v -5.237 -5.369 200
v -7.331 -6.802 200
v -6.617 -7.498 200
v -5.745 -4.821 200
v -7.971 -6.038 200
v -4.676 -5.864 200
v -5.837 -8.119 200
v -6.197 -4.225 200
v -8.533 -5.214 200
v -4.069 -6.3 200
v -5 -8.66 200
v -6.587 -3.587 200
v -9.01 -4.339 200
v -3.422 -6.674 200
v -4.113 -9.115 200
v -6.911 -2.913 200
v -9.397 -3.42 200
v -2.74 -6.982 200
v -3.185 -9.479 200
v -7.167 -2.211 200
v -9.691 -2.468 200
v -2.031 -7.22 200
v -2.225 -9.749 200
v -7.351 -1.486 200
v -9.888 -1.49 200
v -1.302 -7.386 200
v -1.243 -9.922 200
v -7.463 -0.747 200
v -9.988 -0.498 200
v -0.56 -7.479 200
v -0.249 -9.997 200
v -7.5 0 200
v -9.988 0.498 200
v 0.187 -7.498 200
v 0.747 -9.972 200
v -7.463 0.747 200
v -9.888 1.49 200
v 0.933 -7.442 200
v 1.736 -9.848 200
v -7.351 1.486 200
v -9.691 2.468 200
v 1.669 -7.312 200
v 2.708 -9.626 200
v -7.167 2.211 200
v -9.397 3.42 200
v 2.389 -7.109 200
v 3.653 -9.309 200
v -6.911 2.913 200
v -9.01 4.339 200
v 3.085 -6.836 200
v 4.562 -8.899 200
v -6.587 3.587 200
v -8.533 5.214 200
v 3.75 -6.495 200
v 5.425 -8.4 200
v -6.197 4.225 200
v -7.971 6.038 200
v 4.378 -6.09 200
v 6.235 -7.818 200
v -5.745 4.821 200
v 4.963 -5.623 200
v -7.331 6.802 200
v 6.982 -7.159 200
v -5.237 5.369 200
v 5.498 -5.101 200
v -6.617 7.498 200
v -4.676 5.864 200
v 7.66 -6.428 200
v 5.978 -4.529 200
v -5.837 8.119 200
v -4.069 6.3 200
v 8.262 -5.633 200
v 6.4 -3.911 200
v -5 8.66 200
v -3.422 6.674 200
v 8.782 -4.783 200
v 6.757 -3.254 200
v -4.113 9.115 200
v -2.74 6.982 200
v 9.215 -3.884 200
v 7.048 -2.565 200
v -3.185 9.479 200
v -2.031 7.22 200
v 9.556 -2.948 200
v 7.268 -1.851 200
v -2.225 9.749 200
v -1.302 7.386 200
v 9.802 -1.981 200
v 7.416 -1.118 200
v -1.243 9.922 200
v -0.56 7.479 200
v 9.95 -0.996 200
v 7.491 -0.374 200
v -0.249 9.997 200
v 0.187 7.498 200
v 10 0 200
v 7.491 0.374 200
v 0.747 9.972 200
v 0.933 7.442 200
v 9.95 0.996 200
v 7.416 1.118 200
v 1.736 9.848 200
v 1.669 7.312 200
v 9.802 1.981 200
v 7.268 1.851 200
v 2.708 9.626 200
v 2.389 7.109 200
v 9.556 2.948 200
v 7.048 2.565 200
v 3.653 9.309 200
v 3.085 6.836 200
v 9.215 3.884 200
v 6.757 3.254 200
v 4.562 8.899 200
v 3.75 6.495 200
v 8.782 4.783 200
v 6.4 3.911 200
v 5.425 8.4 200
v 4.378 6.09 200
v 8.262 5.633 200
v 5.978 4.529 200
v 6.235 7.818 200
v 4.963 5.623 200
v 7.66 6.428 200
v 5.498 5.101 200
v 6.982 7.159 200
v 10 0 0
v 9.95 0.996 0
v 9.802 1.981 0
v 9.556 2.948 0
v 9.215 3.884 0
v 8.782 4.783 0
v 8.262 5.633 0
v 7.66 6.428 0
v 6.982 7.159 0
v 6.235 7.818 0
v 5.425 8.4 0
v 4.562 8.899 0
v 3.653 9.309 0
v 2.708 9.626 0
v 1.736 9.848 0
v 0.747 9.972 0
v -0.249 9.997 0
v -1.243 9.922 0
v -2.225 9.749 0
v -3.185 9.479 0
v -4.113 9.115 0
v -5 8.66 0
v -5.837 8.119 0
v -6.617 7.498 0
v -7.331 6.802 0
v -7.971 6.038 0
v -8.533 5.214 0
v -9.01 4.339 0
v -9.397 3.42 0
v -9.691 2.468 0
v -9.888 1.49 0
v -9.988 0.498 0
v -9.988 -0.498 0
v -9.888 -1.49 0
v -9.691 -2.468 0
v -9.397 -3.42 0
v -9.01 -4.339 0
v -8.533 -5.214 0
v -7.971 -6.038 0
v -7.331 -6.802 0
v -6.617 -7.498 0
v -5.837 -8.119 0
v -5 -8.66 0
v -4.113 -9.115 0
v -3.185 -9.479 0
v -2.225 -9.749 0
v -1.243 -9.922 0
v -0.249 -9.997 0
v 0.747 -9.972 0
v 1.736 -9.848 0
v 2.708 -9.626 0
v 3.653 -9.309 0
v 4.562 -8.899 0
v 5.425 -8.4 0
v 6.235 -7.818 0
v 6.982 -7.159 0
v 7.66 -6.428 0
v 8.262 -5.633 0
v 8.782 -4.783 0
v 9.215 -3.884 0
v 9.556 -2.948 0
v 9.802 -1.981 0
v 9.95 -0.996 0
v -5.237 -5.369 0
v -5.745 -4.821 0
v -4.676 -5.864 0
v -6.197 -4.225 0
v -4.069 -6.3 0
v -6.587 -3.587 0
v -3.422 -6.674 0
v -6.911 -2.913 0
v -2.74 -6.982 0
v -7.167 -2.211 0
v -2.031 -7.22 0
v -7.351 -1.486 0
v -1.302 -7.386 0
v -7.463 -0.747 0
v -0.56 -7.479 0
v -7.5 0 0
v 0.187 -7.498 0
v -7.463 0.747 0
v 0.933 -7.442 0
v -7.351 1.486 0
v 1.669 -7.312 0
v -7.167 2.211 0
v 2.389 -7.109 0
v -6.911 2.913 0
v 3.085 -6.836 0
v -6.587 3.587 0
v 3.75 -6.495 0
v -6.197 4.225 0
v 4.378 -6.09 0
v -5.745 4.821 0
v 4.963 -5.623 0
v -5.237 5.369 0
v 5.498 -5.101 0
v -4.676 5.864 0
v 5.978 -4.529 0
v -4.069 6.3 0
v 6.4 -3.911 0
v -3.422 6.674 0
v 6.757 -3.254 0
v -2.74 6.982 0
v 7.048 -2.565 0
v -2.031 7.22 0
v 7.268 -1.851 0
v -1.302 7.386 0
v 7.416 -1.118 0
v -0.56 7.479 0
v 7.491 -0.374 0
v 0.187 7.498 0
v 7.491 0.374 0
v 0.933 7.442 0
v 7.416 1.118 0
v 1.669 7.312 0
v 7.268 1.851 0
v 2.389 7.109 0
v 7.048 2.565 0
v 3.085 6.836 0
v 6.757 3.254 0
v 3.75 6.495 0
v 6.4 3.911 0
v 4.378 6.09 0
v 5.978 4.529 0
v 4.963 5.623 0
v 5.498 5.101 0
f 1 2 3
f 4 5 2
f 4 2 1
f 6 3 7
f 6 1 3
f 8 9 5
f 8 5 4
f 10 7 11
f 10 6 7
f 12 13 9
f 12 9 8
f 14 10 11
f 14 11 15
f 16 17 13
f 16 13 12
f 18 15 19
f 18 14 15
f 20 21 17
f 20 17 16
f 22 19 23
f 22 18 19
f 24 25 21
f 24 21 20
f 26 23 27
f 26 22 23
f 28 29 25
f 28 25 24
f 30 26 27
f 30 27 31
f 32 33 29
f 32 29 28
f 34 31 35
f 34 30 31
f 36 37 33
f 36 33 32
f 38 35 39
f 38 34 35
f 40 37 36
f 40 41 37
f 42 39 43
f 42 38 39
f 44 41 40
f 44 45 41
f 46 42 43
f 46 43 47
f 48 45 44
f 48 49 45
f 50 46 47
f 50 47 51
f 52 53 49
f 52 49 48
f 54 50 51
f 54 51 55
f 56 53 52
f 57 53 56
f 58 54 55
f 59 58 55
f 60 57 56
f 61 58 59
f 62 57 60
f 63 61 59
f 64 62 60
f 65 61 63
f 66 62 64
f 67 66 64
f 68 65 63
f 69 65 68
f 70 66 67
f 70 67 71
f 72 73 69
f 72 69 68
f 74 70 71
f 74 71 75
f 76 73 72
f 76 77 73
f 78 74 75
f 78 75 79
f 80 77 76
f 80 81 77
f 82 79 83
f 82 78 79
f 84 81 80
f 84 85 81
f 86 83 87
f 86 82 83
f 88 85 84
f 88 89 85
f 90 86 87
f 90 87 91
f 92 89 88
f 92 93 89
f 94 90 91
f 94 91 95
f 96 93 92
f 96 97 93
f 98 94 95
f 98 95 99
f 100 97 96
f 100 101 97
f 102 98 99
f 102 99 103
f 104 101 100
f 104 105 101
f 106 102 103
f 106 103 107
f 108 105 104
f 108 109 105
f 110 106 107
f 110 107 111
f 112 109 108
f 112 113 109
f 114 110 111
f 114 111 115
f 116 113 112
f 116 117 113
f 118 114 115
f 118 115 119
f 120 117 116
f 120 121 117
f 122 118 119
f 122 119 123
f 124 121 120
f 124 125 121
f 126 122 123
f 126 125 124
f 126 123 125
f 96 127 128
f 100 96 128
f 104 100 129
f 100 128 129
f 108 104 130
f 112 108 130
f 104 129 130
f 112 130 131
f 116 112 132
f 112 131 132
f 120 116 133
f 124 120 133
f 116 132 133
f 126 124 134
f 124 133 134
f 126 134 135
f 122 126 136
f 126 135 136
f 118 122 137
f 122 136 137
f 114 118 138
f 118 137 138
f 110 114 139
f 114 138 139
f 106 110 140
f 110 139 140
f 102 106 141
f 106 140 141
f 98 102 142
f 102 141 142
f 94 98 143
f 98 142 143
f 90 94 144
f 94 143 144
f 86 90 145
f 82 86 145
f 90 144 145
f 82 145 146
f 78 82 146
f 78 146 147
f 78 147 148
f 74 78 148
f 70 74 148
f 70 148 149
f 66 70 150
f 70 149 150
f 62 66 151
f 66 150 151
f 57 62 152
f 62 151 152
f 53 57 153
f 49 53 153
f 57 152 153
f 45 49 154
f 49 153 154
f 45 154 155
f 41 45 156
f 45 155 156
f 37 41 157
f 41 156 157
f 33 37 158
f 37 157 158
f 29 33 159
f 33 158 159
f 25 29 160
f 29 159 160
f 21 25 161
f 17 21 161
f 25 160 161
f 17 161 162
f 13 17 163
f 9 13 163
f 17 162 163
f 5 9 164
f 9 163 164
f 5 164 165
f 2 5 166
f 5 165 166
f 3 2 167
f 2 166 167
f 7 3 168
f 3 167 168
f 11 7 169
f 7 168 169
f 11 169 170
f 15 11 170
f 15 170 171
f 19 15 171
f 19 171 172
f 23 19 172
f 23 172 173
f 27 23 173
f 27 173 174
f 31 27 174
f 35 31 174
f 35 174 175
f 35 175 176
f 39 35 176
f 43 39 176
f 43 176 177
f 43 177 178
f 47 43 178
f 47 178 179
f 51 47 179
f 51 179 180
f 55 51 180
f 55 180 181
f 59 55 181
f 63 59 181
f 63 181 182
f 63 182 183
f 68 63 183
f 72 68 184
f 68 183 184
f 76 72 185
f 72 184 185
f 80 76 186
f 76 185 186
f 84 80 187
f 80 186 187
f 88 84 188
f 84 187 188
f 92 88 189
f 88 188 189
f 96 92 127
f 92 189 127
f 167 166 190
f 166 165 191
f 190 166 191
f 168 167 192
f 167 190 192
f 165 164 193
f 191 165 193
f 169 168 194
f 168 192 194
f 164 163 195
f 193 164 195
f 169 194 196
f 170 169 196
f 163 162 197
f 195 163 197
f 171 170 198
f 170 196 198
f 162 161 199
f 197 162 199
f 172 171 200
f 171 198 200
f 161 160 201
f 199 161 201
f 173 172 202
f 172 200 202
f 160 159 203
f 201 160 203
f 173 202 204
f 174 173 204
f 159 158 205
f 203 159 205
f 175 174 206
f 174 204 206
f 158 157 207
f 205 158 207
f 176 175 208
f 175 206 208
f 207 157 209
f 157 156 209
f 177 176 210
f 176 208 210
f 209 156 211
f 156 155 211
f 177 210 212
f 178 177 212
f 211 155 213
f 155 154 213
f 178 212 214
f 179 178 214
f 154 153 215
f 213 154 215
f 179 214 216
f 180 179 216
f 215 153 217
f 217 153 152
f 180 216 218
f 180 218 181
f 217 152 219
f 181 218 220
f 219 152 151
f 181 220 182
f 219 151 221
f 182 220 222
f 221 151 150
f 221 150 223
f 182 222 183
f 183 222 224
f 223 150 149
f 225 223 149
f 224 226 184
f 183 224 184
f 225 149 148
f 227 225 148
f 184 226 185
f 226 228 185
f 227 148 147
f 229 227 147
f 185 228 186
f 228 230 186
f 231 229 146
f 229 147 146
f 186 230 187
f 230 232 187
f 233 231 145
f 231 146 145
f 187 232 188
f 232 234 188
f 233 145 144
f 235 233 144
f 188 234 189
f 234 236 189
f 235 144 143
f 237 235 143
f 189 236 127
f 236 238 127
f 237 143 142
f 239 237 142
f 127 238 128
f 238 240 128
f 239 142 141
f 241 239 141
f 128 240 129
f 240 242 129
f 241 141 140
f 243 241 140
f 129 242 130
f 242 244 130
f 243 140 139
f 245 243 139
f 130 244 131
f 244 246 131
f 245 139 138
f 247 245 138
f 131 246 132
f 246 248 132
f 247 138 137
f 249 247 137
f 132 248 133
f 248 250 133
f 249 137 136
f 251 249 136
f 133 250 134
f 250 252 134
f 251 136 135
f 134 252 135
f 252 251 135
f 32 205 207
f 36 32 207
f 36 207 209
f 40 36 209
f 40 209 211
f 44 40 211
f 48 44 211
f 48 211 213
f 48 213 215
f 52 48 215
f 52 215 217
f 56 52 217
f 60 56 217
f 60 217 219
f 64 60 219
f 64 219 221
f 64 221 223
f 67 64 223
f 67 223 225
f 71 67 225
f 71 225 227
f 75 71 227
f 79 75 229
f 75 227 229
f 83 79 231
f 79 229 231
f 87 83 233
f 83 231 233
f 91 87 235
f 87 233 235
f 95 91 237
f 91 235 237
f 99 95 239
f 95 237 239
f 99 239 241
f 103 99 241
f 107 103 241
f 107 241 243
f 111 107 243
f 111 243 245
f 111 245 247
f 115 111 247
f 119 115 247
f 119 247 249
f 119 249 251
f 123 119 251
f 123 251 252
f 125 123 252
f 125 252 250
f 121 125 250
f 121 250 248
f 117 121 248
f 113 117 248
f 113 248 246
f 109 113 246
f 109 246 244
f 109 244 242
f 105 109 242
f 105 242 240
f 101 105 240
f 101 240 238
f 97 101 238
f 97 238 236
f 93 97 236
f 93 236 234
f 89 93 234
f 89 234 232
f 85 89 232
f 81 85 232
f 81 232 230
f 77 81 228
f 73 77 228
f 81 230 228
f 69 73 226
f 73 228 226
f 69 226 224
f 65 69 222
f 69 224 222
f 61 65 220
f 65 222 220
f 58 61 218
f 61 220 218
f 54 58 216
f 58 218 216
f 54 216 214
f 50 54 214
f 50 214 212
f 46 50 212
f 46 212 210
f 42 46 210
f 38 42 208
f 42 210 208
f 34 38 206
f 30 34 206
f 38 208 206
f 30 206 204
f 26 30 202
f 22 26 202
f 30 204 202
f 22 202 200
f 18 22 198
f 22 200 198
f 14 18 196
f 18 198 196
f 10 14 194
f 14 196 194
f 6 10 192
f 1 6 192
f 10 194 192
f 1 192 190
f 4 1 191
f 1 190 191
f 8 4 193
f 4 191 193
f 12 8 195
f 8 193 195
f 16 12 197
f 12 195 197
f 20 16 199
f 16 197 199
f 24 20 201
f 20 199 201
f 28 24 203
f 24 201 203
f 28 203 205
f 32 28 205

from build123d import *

# Parameters (mm, degrees)
F0_R     = 10
F1_DEPTH = 200
F4_D     = 3
F4_DEPTH = 100
F6_D     = 15
F6_DEPTH = 200


with BuildPart() as f1:
    # F0 (on Top) → F1 (new body)
    with BuildSketch(Plane.XY):
        Circle(F0_R)
    extrude(amount=F1_DEPTH)

    # F4
    with Locations(Plane(origin=(0, 0, 0), x_dir=(1, 0, 0), z_dir=(0, 0, -1))):
        with Locations((0, 0)):
            Hole(F4_D / 2, depth=F4_DEPTH)

    # F6
    with Locations(Plane.XY.offset(200)):
        with Locations((0, 0)):
            Hole(F6_D / 2, depth=F6_DEPTH)


solid = f1.part
